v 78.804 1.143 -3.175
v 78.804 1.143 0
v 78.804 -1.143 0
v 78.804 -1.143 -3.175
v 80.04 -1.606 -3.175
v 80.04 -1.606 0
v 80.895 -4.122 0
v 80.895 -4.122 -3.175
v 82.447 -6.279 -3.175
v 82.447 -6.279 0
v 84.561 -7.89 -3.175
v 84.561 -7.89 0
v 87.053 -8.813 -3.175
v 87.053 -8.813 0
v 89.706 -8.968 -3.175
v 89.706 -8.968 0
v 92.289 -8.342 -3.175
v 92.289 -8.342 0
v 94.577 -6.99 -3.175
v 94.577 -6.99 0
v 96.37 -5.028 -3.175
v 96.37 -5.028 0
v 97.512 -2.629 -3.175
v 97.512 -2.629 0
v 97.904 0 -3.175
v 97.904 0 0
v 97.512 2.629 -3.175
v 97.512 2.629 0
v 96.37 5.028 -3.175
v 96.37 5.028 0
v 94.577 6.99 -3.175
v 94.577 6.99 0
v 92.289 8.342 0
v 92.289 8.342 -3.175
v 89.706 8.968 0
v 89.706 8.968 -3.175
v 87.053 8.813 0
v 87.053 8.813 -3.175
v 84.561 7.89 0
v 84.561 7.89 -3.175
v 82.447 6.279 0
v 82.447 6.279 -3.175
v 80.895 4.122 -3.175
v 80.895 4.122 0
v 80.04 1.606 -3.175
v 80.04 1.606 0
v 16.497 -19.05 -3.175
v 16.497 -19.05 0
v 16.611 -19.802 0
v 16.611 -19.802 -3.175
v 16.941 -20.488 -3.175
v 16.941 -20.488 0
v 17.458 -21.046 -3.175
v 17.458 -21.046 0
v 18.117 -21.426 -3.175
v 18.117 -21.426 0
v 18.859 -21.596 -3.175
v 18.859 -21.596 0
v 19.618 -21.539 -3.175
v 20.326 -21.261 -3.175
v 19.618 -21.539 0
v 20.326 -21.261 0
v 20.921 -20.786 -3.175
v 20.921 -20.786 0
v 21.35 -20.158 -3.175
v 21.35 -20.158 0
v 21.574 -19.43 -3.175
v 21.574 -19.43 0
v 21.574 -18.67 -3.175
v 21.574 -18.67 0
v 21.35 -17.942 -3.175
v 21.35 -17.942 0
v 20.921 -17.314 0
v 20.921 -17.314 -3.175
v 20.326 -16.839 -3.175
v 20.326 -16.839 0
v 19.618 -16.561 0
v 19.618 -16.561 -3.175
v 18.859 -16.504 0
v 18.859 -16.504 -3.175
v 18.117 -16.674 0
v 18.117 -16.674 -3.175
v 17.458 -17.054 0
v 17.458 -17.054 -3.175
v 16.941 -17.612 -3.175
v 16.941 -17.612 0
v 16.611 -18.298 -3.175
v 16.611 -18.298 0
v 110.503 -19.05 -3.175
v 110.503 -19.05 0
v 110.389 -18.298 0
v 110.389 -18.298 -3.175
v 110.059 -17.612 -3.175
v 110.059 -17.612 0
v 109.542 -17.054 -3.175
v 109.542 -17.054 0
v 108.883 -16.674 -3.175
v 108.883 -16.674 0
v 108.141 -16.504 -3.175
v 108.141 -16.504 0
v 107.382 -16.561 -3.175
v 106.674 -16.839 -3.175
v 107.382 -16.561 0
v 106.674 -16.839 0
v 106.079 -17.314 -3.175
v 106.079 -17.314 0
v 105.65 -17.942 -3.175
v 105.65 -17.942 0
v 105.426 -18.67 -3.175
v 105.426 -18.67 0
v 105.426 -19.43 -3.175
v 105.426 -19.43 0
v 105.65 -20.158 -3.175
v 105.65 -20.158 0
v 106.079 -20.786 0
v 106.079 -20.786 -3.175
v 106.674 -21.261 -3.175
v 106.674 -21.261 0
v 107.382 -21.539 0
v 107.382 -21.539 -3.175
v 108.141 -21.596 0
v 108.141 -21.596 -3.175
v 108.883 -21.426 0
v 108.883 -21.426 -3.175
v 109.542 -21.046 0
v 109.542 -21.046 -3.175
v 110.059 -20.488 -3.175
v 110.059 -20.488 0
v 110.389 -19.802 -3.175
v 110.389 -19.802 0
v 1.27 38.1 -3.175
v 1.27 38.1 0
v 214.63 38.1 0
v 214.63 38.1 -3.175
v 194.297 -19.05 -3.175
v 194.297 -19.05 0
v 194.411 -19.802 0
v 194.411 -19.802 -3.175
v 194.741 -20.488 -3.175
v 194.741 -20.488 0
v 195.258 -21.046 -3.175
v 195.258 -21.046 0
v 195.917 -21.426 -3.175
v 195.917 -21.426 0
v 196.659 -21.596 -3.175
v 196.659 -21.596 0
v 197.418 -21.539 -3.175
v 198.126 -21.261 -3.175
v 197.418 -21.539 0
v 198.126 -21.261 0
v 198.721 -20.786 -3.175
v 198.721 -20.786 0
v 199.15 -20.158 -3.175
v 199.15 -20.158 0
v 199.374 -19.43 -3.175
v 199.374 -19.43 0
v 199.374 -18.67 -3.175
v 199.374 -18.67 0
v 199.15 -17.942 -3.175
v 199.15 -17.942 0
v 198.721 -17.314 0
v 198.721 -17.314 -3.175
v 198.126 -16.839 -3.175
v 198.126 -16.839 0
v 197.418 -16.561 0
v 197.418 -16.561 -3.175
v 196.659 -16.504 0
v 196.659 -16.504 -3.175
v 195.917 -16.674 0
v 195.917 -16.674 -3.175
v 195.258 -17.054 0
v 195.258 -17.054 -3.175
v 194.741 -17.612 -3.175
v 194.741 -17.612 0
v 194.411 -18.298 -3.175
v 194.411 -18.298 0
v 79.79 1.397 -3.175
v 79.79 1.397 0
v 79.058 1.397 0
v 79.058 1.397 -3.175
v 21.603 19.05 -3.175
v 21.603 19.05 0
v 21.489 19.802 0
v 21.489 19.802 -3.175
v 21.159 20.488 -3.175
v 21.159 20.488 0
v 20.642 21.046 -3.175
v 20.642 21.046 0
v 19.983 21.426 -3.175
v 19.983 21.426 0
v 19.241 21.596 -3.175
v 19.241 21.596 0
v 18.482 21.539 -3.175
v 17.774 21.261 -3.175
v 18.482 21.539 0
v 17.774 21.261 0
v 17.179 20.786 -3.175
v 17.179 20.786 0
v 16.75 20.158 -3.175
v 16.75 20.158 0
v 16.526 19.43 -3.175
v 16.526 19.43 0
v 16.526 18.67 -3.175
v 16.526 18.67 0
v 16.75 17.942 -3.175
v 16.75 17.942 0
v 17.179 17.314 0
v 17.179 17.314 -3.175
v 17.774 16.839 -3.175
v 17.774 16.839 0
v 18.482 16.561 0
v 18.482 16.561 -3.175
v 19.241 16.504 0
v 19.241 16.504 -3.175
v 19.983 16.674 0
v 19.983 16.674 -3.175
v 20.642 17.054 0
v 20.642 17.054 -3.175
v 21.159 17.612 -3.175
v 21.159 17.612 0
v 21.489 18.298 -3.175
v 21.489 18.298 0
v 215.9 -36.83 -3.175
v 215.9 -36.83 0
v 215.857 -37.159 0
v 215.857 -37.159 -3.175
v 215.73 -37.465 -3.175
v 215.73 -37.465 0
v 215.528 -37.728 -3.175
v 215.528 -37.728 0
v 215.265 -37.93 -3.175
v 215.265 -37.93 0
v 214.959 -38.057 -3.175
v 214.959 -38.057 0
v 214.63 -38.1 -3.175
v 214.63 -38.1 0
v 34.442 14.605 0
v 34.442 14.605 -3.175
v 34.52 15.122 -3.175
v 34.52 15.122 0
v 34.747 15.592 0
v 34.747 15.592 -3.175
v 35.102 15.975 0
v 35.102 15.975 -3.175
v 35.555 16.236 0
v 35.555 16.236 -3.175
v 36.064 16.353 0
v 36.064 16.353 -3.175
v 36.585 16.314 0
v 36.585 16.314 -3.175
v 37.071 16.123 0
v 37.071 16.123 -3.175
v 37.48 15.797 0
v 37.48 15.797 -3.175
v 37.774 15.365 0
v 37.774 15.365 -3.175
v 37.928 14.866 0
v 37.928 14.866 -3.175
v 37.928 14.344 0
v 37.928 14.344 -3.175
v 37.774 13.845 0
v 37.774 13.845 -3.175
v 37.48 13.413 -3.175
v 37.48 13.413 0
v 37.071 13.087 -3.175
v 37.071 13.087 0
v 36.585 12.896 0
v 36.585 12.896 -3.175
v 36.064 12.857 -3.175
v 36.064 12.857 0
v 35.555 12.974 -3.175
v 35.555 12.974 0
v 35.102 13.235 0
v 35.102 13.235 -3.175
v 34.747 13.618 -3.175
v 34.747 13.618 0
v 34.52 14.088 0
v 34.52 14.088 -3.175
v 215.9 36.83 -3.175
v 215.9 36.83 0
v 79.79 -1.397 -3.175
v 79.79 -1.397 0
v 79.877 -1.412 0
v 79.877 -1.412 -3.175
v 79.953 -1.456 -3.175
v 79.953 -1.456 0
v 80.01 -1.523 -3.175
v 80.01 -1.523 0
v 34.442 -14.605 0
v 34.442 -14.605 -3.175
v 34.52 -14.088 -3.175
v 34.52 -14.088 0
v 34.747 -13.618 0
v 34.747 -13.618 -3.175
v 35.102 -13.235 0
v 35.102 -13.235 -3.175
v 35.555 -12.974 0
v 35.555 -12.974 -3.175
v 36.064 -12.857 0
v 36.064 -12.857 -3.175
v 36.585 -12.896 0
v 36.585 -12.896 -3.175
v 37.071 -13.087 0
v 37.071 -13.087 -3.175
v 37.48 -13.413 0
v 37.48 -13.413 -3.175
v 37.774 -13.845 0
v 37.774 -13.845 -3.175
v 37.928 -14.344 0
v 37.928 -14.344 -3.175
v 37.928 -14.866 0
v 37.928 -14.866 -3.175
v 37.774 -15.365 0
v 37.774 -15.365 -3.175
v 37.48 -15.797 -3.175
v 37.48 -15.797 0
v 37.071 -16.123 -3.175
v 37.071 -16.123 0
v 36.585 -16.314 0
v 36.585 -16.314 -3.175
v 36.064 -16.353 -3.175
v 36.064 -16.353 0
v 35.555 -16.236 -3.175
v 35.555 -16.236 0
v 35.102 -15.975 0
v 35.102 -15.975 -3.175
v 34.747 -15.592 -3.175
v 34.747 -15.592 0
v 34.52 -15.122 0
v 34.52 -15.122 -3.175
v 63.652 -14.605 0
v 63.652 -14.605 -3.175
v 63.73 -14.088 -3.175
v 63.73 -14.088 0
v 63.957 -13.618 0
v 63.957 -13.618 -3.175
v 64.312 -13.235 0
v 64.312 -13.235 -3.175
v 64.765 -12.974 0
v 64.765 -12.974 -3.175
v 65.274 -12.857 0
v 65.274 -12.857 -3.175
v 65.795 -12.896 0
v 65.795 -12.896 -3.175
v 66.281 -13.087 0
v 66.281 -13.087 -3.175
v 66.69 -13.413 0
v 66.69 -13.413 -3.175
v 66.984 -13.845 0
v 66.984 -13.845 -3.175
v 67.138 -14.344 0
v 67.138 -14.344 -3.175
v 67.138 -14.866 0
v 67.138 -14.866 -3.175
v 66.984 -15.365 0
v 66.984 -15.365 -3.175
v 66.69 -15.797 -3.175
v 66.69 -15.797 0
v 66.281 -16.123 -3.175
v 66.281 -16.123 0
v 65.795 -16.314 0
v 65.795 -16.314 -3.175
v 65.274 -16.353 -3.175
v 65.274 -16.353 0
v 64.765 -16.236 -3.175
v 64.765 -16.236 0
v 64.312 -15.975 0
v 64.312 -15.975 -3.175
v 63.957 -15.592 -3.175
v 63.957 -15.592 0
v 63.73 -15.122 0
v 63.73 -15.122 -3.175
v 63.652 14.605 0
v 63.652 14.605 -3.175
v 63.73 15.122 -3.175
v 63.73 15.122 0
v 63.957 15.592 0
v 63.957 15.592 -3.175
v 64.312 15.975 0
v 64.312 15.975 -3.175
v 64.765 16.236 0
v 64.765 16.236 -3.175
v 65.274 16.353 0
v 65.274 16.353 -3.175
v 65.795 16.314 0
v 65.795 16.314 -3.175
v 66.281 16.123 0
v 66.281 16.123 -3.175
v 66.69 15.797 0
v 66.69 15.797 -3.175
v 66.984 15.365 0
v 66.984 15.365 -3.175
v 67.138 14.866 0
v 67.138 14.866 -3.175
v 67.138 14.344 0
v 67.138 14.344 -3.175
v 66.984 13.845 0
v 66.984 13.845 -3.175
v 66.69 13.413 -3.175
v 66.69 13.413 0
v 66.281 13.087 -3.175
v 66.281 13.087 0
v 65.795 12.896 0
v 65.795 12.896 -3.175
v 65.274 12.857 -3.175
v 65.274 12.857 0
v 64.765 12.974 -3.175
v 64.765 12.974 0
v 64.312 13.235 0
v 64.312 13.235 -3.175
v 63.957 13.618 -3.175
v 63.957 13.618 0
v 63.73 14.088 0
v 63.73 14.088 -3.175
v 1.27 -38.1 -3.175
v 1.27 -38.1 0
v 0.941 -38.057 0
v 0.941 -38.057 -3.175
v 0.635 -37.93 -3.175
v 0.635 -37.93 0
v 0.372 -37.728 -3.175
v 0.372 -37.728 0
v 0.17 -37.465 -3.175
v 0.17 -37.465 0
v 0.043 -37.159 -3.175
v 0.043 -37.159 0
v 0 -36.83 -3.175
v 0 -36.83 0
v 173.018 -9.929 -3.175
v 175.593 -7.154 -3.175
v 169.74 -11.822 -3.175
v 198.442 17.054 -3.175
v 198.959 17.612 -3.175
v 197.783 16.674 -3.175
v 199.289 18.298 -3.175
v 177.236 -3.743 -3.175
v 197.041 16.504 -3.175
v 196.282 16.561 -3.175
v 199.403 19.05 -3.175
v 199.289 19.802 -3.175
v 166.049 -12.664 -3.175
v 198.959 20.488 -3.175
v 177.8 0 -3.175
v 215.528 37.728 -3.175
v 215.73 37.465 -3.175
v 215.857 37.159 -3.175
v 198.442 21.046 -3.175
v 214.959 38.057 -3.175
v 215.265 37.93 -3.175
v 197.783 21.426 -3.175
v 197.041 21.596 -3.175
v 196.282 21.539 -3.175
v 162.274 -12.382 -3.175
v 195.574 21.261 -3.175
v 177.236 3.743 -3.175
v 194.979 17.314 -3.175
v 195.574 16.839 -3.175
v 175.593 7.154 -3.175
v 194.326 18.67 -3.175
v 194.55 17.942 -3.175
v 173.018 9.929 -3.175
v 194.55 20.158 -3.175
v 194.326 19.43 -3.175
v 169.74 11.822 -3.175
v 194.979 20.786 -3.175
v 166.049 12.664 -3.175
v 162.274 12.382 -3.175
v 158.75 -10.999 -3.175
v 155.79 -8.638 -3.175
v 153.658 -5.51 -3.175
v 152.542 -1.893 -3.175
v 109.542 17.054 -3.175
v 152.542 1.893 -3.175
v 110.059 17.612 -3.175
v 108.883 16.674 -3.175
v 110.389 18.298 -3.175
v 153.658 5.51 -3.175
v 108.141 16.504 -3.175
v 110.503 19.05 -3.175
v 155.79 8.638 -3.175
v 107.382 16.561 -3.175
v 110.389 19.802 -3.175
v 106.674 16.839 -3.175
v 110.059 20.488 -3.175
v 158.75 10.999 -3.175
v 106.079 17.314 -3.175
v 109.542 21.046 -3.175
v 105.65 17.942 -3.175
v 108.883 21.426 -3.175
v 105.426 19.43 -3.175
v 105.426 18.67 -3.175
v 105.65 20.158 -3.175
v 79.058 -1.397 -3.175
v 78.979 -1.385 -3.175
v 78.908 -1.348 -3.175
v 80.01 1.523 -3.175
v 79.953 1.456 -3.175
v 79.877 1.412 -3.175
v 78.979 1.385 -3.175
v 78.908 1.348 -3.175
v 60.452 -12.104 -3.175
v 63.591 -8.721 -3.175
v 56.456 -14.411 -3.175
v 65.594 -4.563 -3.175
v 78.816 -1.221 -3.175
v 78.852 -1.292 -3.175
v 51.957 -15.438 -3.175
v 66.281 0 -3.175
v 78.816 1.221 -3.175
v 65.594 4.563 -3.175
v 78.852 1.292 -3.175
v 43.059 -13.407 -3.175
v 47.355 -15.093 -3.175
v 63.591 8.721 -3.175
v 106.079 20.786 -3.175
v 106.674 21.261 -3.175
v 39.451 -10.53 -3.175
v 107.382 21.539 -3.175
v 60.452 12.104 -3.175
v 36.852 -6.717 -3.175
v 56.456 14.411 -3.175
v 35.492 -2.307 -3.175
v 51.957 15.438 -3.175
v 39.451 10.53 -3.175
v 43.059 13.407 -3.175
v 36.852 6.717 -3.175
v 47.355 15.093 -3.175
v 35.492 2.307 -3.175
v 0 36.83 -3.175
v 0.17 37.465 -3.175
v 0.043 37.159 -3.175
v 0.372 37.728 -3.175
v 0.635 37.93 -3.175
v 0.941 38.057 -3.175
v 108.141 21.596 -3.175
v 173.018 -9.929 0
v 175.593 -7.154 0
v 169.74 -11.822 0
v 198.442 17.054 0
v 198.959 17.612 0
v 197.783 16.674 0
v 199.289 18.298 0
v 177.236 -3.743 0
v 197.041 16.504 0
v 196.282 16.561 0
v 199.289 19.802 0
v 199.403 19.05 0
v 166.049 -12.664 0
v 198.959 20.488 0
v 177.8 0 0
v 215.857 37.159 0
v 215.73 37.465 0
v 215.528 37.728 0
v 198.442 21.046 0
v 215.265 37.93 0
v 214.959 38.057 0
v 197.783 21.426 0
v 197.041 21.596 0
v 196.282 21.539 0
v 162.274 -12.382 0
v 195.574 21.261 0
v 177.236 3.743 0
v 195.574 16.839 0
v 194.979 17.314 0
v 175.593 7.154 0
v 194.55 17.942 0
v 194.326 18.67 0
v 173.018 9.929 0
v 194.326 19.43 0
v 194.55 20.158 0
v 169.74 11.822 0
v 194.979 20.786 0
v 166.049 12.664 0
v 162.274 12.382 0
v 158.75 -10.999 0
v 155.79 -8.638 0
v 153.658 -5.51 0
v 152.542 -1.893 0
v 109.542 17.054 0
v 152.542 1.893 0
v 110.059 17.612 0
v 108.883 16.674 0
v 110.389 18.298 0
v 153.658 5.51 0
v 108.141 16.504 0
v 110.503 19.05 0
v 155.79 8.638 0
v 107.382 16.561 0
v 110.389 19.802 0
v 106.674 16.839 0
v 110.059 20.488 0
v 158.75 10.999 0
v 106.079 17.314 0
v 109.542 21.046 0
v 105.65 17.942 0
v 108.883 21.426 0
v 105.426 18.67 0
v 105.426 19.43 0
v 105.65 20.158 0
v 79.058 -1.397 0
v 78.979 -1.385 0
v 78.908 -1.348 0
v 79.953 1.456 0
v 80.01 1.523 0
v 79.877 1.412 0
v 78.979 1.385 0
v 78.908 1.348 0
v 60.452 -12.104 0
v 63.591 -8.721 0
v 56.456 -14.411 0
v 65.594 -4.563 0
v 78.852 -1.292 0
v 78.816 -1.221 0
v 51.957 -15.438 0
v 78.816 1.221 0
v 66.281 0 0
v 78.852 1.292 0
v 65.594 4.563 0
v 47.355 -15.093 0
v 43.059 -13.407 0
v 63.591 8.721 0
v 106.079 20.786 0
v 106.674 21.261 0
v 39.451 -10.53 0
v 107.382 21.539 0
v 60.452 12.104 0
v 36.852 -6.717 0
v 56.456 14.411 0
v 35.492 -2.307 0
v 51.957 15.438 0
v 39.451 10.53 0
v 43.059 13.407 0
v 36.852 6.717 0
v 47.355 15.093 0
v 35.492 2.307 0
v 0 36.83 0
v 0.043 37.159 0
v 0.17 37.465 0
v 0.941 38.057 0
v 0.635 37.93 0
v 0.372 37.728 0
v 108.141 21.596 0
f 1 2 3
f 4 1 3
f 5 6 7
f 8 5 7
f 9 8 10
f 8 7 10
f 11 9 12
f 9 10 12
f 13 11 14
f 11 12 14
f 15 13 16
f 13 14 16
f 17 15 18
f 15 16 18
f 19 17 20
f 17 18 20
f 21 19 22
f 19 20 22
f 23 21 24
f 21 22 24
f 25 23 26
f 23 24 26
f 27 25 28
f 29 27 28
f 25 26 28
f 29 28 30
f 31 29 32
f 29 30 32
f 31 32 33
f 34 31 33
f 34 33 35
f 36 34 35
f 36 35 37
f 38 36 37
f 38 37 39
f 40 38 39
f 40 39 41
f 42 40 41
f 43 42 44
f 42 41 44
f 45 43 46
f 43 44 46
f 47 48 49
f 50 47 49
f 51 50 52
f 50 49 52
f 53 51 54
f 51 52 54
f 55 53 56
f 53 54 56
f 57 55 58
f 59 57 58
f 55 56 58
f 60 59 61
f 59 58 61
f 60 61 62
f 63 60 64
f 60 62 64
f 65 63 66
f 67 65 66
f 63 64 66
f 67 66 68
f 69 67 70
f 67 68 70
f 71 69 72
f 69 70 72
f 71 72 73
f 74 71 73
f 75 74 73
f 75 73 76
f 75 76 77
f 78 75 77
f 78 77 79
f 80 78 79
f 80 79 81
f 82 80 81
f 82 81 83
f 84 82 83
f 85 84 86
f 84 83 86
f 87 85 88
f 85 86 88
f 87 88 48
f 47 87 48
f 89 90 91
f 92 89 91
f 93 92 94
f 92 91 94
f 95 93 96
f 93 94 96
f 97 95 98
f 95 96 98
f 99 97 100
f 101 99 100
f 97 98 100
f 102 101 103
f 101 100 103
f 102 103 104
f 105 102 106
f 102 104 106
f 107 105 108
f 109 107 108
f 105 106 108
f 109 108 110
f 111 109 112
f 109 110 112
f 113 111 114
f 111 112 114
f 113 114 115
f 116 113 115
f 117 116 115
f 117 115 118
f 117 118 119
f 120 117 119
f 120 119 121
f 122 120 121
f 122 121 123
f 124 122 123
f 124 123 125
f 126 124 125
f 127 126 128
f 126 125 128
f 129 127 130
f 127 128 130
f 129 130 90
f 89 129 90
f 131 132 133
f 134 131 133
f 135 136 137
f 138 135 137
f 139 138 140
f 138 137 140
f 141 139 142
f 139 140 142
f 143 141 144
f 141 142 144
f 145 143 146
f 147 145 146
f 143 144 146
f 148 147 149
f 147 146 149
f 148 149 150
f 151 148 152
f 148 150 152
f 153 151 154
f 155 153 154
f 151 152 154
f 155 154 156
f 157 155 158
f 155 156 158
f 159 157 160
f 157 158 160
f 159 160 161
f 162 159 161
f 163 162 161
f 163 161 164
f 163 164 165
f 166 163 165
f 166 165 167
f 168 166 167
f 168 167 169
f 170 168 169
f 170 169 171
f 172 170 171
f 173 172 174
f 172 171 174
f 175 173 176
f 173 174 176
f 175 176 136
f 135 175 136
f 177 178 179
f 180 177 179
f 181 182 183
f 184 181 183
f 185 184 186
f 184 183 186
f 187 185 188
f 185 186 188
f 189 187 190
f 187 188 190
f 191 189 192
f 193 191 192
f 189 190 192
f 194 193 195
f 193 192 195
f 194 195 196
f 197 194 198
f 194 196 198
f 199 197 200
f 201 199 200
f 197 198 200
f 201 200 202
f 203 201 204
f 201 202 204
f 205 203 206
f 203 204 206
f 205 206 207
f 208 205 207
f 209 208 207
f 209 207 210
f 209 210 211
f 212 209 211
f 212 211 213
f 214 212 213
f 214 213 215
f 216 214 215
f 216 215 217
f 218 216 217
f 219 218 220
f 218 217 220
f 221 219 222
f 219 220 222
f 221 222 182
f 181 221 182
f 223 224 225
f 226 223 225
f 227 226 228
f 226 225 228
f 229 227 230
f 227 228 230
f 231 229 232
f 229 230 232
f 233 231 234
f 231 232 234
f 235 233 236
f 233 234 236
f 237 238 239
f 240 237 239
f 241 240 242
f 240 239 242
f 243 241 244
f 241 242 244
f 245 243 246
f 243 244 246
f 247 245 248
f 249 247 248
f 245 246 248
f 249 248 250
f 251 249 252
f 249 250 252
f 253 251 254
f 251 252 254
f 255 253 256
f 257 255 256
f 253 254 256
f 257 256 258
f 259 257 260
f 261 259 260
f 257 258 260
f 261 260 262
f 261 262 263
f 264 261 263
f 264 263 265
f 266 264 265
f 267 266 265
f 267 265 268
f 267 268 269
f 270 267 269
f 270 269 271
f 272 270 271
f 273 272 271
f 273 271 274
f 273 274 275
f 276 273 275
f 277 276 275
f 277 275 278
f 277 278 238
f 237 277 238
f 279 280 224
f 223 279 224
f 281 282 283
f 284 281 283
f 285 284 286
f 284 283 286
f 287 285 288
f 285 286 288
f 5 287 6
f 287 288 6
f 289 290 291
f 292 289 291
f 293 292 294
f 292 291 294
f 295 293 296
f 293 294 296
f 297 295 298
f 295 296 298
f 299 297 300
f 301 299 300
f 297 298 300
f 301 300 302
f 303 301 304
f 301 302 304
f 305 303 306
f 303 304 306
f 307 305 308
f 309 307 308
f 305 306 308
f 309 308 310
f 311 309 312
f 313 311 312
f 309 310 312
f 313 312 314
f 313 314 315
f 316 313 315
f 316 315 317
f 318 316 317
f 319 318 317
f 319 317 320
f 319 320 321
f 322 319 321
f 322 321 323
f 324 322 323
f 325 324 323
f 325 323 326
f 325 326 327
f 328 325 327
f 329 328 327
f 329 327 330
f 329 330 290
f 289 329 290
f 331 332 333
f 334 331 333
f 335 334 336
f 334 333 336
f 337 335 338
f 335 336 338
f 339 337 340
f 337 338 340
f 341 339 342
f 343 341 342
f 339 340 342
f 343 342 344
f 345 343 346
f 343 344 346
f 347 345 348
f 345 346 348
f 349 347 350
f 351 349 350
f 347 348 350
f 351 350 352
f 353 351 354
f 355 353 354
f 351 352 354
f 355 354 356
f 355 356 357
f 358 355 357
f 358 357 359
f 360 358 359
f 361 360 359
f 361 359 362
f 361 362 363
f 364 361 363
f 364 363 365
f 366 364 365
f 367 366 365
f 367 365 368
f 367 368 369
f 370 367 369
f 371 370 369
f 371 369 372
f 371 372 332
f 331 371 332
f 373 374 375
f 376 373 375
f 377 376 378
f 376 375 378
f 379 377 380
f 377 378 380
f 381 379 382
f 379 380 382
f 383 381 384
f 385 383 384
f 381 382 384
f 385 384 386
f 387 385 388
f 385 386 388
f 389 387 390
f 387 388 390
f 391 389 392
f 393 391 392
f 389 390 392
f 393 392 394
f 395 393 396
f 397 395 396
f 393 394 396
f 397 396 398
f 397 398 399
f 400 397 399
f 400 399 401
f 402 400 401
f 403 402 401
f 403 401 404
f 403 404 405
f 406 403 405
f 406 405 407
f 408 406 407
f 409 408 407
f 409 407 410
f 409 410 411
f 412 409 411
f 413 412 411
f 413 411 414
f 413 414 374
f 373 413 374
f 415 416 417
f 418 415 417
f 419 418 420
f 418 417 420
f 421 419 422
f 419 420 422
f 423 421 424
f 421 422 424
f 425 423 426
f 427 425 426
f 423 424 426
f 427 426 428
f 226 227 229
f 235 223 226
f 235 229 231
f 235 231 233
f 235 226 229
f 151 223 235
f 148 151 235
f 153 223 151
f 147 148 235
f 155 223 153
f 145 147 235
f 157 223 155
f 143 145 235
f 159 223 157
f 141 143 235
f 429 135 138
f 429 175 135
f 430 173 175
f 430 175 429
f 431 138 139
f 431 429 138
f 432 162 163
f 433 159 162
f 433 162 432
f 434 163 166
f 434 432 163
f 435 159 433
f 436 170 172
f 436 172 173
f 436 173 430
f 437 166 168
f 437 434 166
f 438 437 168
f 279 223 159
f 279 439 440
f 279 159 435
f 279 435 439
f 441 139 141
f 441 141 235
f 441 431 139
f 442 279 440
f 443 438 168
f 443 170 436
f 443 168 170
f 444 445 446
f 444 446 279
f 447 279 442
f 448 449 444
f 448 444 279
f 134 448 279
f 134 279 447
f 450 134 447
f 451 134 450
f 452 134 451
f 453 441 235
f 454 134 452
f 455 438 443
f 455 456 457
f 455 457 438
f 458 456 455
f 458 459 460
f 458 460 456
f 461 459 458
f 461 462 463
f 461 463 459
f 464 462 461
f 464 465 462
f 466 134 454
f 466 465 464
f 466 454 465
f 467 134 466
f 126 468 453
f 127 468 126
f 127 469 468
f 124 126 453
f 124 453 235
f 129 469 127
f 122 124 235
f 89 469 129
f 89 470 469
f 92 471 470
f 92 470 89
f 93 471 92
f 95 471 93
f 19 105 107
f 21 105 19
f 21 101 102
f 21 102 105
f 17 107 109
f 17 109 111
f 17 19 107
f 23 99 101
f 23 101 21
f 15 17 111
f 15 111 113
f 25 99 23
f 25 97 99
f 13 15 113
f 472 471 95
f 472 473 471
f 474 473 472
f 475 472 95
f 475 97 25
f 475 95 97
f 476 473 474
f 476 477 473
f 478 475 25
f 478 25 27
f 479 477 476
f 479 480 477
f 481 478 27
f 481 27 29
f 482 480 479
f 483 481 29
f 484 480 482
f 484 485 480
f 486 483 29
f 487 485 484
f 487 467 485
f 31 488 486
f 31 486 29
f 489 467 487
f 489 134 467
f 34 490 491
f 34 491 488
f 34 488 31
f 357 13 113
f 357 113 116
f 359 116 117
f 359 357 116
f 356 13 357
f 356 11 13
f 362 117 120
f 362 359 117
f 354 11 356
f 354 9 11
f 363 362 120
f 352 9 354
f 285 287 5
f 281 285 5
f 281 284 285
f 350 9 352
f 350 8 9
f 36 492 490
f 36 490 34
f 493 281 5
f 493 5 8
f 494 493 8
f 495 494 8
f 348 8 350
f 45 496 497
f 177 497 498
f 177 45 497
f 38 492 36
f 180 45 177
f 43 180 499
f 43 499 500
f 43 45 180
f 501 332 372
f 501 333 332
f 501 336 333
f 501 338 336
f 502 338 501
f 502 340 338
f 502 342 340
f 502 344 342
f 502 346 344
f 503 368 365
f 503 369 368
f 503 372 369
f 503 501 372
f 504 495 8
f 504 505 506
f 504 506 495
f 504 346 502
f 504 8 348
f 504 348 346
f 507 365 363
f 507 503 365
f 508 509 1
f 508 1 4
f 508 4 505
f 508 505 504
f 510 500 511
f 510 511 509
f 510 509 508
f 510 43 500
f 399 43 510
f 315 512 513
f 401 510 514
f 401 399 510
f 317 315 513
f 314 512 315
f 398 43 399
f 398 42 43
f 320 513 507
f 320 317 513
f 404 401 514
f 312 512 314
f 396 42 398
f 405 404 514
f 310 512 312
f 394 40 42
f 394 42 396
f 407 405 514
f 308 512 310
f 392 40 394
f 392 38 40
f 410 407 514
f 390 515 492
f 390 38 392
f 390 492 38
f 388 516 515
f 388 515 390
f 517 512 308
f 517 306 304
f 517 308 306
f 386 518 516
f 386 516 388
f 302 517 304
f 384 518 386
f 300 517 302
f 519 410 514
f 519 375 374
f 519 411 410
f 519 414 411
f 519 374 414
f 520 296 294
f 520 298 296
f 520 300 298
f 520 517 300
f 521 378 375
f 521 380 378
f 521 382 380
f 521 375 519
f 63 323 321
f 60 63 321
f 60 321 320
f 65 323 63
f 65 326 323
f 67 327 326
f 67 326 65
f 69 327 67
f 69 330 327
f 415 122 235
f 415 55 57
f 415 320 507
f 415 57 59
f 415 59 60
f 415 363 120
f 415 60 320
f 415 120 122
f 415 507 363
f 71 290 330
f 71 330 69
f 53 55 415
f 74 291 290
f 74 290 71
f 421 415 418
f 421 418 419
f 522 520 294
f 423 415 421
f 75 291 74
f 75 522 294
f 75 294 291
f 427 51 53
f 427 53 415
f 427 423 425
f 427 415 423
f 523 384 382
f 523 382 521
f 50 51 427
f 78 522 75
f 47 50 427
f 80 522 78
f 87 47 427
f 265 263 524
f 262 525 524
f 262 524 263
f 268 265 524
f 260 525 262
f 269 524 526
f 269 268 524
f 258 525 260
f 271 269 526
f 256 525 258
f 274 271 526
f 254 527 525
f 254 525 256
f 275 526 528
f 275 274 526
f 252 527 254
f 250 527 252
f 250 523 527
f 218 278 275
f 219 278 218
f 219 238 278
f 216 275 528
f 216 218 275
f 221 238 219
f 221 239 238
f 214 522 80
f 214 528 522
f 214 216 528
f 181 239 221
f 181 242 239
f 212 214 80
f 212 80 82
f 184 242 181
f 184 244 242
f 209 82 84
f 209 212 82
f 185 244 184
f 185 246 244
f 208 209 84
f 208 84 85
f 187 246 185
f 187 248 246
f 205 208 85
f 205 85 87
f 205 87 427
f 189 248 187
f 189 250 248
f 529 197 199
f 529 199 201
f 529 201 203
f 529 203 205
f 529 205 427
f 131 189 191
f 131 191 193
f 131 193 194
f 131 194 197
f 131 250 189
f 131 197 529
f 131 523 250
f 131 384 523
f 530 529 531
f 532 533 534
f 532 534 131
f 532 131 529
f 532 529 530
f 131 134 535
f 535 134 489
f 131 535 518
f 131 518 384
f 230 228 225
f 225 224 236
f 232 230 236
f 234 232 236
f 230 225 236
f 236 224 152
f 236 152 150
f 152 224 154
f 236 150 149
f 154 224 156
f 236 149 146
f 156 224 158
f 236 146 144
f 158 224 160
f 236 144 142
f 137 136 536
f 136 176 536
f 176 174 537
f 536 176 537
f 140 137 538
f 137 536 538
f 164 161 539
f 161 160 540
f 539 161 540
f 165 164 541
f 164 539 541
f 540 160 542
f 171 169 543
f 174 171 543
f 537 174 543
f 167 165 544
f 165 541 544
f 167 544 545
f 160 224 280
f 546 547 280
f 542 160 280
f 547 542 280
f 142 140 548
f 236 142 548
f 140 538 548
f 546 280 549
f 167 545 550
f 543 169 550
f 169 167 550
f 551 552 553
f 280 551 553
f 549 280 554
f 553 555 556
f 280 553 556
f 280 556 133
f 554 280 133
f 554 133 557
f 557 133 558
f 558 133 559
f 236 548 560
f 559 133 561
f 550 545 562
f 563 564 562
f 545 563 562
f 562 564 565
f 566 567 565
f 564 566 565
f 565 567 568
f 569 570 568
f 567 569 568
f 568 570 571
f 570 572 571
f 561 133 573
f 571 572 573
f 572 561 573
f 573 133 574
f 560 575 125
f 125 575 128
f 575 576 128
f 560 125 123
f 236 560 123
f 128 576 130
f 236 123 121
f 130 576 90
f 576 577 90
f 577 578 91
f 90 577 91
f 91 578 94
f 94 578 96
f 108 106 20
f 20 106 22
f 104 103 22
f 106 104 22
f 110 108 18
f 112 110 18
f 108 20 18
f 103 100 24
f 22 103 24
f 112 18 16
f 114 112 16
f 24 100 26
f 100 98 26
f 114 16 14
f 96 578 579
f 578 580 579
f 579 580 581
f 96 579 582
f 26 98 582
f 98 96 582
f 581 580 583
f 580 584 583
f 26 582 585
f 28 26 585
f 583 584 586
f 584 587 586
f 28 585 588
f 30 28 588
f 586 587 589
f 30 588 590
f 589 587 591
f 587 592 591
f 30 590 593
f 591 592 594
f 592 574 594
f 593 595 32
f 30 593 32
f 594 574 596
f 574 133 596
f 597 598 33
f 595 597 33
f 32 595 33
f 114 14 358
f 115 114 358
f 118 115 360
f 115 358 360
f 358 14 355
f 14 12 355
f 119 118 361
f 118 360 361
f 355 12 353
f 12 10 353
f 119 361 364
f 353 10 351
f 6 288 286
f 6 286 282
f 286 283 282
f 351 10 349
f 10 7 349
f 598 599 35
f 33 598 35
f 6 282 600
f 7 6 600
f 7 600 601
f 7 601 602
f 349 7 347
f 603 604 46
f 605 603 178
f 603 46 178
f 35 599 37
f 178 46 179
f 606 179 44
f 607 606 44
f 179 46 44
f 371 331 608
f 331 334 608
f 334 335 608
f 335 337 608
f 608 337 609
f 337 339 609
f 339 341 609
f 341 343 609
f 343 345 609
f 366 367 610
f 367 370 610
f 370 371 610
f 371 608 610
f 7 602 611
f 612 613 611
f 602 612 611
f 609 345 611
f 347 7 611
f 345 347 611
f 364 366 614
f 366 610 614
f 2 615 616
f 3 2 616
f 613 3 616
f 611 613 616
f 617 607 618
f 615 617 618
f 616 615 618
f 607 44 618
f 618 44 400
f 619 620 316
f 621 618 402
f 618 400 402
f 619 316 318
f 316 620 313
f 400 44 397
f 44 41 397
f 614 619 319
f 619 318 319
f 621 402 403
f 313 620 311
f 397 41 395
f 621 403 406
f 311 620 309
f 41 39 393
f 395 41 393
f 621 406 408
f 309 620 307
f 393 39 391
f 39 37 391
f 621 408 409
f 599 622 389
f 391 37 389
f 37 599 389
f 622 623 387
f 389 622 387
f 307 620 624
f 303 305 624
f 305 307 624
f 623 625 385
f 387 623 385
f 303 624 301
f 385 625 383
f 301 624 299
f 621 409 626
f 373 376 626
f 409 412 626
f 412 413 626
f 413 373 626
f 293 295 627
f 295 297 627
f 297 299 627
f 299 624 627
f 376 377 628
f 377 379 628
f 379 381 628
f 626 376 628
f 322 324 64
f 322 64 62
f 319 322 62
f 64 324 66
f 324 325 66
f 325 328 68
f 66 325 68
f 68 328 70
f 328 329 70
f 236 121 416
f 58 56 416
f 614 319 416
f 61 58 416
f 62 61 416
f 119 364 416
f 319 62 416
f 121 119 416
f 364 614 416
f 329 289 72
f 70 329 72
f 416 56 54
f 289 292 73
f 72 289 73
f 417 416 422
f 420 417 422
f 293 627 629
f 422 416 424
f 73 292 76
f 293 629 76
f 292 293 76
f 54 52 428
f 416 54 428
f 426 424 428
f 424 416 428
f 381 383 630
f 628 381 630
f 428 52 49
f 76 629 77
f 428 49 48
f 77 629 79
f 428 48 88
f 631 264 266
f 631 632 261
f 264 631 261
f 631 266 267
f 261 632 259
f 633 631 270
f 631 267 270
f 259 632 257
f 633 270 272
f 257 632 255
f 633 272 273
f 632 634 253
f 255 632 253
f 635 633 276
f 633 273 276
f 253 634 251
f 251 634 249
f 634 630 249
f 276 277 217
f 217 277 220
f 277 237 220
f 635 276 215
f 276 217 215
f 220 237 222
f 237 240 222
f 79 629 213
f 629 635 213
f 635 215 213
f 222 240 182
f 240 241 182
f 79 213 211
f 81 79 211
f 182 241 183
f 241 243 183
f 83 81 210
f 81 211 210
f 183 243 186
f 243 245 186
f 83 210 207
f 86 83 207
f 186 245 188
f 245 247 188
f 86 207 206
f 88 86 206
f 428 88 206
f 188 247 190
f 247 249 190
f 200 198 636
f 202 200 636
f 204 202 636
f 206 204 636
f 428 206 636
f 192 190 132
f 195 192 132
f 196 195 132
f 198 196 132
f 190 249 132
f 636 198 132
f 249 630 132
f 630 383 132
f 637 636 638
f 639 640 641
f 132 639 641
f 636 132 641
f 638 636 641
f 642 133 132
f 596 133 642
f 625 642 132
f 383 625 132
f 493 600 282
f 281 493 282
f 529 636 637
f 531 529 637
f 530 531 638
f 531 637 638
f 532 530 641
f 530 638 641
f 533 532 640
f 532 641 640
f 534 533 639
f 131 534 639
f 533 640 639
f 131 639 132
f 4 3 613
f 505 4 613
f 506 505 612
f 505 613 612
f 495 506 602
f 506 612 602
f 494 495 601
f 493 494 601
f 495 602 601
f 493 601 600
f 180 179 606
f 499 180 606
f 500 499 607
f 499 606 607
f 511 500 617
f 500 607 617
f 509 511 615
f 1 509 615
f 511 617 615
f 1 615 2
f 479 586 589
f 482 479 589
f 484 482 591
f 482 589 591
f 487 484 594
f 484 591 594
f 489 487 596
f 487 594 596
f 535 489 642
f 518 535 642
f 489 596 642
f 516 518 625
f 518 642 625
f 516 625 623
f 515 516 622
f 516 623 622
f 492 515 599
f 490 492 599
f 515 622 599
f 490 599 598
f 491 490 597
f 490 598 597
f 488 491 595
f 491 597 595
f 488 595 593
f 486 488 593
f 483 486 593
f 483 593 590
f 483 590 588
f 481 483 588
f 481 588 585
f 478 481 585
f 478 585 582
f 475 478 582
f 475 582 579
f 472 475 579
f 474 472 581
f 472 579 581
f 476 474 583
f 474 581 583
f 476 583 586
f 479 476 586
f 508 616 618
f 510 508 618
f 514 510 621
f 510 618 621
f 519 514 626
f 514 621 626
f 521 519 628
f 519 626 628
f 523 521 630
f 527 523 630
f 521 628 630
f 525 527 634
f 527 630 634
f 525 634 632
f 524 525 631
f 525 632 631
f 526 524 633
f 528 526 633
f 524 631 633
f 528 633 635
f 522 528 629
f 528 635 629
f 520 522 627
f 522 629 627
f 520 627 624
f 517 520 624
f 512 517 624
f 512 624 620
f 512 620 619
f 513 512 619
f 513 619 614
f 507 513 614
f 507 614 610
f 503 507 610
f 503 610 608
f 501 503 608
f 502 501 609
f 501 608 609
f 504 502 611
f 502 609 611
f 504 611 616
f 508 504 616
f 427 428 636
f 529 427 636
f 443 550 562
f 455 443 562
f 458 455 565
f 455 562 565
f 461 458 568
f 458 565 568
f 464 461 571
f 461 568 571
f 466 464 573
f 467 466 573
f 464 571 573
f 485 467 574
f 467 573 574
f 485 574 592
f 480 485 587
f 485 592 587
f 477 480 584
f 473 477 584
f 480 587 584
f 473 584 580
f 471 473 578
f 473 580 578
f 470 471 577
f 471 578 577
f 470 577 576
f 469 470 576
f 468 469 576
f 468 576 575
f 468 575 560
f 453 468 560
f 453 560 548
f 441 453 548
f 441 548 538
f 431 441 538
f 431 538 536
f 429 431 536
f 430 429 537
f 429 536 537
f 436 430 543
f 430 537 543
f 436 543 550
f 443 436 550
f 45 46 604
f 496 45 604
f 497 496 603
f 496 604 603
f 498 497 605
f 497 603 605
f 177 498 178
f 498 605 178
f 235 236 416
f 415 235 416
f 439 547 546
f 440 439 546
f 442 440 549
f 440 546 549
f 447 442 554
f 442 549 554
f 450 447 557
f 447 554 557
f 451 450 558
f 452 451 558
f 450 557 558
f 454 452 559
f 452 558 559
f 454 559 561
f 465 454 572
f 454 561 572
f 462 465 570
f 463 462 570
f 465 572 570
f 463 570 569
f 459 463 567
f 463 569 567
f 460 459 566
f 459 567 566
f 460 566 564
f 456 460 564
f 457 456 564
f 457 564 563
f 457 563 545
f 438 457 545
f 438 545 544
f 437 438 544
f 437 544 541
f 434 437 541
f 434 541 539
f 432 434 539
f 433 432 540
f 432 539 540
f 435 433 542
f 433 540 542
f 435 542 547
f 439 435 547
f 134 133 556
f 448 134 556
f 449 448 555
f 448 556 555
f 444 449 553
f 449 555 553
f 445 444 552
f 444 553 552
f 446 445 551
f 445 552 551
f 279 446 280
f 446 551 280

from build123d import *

# Parameters (mm, degrees)
SKETCH1_R             = 12.7
SKETCH1_R_2           = 15.4813
SKETCH1_R_3           = 2.5527
EXTRUDE1_DEPTH        = 3.175
F_6_32_TAPPED_HOLE1_D = 3.5052


with BuildPart() as part:
    # Sketch1 → Extrude1 (new body)
    with BuildSketch(Plane.XY):
        with BuildLine():
            Line((1.27, 38.1), (214.63, 38.1))
            ThreePointArc((214.63, 38.1), (215.528025612, 37.728025612), (215.9, 36.83))
            Line((215.9, 36.83), (215.9, -36.83))
            ThreePointArc((215.9, -36.83), (215.528025612, -37.728025612), (214.63, -38.1))
            Line((214.63, -38.1), (1.27, -38.1))
            ThreePointArc((1.27, -38.1), (0.371974388, -37.728025612), (0, -36.83))
            Line((0, -36.83), (0, 36.83))
            ThreePointArc((0, 36.83), (0.371974388, 37.728025612), (1.27, 38.1))
        make_face()
        with Locations((165.1, 0)):
            Circle(SKETCH1_R, mode=Mode.SUBTRACT)
        with Locations((50.8, 0)):
            Circle(SKETCH1_R_2, mode=Mode.SUBTRACT)
        with Locations((19.05, 19.05)):
            Circle(SKETCH1_R_3, mode=Mode.SUBTRACT)
        with Locations((196.85, 19.05)):
            Circle(SKETCH1_R_3, mode=Mode.SUBTRACT)
        with Locations(Location((196.85, -19.05, 0), (0, 0, 180))):
            Circle(SKETCH1_R_3, mode=Mode.SUBTRACT)
        with Locations(Location((19.05, -19.05, 0), (0, 0, 180))):
            Circle(SKETCH1_R_3, mode=Mode.SUBTRACT)
        with Locations((107.95, 19.05)):
            Circle(SKETCH1_R_3, mode=Mode.SUBTRACT)
        with Locations((107.95, -19.05)):
            Circle(SKETCH1_R_3, mode=Mode.SUBTRACT)
        with BuildLine():
            Line((79.790097811, 1.397), (79.0575, 1.397))
            ThreePointArc((79.0575, 1.397), (78.877894878, 1.322605122), (78.8035, 1.143))
            Line((78.8035, 1.143), (78.8035, -1.143))
            ThreePointArc((78.8035, -1.143), (78.877894878, -1.322605122), (79.0575, -1.397))
            Line((79.0575, -1.397), (79.790097811, -1.397))
            ThreePointArc((79.790097811, -1.397), (79.952903046, -1.456037297), (80.040026541, -1.605705075))
            ThreePointArc((80.040026541, -1.605705075), (97.9043, 0), (80.040026541, 1.605705075))
            ThreePointArc((80.040026541, 1.605705075), (79.952903046, 1.456037297), (79.790097811, 1.397))
        make_face(mode=Mode.SUBTRACT)
    extrude(amount=-EXTRUDE1_DEPTH)

    # #6-32 Tapped Hole1 (through all)
    with Locations(Plane.XY):
        with Locations((36.195, 14.605), (65.405, 14.605), (65.405, -14.605), (36.195, -14.605)):
            Hole(F_6_32_TAPPED_HOLE1_D / 2)


solid = part.part
